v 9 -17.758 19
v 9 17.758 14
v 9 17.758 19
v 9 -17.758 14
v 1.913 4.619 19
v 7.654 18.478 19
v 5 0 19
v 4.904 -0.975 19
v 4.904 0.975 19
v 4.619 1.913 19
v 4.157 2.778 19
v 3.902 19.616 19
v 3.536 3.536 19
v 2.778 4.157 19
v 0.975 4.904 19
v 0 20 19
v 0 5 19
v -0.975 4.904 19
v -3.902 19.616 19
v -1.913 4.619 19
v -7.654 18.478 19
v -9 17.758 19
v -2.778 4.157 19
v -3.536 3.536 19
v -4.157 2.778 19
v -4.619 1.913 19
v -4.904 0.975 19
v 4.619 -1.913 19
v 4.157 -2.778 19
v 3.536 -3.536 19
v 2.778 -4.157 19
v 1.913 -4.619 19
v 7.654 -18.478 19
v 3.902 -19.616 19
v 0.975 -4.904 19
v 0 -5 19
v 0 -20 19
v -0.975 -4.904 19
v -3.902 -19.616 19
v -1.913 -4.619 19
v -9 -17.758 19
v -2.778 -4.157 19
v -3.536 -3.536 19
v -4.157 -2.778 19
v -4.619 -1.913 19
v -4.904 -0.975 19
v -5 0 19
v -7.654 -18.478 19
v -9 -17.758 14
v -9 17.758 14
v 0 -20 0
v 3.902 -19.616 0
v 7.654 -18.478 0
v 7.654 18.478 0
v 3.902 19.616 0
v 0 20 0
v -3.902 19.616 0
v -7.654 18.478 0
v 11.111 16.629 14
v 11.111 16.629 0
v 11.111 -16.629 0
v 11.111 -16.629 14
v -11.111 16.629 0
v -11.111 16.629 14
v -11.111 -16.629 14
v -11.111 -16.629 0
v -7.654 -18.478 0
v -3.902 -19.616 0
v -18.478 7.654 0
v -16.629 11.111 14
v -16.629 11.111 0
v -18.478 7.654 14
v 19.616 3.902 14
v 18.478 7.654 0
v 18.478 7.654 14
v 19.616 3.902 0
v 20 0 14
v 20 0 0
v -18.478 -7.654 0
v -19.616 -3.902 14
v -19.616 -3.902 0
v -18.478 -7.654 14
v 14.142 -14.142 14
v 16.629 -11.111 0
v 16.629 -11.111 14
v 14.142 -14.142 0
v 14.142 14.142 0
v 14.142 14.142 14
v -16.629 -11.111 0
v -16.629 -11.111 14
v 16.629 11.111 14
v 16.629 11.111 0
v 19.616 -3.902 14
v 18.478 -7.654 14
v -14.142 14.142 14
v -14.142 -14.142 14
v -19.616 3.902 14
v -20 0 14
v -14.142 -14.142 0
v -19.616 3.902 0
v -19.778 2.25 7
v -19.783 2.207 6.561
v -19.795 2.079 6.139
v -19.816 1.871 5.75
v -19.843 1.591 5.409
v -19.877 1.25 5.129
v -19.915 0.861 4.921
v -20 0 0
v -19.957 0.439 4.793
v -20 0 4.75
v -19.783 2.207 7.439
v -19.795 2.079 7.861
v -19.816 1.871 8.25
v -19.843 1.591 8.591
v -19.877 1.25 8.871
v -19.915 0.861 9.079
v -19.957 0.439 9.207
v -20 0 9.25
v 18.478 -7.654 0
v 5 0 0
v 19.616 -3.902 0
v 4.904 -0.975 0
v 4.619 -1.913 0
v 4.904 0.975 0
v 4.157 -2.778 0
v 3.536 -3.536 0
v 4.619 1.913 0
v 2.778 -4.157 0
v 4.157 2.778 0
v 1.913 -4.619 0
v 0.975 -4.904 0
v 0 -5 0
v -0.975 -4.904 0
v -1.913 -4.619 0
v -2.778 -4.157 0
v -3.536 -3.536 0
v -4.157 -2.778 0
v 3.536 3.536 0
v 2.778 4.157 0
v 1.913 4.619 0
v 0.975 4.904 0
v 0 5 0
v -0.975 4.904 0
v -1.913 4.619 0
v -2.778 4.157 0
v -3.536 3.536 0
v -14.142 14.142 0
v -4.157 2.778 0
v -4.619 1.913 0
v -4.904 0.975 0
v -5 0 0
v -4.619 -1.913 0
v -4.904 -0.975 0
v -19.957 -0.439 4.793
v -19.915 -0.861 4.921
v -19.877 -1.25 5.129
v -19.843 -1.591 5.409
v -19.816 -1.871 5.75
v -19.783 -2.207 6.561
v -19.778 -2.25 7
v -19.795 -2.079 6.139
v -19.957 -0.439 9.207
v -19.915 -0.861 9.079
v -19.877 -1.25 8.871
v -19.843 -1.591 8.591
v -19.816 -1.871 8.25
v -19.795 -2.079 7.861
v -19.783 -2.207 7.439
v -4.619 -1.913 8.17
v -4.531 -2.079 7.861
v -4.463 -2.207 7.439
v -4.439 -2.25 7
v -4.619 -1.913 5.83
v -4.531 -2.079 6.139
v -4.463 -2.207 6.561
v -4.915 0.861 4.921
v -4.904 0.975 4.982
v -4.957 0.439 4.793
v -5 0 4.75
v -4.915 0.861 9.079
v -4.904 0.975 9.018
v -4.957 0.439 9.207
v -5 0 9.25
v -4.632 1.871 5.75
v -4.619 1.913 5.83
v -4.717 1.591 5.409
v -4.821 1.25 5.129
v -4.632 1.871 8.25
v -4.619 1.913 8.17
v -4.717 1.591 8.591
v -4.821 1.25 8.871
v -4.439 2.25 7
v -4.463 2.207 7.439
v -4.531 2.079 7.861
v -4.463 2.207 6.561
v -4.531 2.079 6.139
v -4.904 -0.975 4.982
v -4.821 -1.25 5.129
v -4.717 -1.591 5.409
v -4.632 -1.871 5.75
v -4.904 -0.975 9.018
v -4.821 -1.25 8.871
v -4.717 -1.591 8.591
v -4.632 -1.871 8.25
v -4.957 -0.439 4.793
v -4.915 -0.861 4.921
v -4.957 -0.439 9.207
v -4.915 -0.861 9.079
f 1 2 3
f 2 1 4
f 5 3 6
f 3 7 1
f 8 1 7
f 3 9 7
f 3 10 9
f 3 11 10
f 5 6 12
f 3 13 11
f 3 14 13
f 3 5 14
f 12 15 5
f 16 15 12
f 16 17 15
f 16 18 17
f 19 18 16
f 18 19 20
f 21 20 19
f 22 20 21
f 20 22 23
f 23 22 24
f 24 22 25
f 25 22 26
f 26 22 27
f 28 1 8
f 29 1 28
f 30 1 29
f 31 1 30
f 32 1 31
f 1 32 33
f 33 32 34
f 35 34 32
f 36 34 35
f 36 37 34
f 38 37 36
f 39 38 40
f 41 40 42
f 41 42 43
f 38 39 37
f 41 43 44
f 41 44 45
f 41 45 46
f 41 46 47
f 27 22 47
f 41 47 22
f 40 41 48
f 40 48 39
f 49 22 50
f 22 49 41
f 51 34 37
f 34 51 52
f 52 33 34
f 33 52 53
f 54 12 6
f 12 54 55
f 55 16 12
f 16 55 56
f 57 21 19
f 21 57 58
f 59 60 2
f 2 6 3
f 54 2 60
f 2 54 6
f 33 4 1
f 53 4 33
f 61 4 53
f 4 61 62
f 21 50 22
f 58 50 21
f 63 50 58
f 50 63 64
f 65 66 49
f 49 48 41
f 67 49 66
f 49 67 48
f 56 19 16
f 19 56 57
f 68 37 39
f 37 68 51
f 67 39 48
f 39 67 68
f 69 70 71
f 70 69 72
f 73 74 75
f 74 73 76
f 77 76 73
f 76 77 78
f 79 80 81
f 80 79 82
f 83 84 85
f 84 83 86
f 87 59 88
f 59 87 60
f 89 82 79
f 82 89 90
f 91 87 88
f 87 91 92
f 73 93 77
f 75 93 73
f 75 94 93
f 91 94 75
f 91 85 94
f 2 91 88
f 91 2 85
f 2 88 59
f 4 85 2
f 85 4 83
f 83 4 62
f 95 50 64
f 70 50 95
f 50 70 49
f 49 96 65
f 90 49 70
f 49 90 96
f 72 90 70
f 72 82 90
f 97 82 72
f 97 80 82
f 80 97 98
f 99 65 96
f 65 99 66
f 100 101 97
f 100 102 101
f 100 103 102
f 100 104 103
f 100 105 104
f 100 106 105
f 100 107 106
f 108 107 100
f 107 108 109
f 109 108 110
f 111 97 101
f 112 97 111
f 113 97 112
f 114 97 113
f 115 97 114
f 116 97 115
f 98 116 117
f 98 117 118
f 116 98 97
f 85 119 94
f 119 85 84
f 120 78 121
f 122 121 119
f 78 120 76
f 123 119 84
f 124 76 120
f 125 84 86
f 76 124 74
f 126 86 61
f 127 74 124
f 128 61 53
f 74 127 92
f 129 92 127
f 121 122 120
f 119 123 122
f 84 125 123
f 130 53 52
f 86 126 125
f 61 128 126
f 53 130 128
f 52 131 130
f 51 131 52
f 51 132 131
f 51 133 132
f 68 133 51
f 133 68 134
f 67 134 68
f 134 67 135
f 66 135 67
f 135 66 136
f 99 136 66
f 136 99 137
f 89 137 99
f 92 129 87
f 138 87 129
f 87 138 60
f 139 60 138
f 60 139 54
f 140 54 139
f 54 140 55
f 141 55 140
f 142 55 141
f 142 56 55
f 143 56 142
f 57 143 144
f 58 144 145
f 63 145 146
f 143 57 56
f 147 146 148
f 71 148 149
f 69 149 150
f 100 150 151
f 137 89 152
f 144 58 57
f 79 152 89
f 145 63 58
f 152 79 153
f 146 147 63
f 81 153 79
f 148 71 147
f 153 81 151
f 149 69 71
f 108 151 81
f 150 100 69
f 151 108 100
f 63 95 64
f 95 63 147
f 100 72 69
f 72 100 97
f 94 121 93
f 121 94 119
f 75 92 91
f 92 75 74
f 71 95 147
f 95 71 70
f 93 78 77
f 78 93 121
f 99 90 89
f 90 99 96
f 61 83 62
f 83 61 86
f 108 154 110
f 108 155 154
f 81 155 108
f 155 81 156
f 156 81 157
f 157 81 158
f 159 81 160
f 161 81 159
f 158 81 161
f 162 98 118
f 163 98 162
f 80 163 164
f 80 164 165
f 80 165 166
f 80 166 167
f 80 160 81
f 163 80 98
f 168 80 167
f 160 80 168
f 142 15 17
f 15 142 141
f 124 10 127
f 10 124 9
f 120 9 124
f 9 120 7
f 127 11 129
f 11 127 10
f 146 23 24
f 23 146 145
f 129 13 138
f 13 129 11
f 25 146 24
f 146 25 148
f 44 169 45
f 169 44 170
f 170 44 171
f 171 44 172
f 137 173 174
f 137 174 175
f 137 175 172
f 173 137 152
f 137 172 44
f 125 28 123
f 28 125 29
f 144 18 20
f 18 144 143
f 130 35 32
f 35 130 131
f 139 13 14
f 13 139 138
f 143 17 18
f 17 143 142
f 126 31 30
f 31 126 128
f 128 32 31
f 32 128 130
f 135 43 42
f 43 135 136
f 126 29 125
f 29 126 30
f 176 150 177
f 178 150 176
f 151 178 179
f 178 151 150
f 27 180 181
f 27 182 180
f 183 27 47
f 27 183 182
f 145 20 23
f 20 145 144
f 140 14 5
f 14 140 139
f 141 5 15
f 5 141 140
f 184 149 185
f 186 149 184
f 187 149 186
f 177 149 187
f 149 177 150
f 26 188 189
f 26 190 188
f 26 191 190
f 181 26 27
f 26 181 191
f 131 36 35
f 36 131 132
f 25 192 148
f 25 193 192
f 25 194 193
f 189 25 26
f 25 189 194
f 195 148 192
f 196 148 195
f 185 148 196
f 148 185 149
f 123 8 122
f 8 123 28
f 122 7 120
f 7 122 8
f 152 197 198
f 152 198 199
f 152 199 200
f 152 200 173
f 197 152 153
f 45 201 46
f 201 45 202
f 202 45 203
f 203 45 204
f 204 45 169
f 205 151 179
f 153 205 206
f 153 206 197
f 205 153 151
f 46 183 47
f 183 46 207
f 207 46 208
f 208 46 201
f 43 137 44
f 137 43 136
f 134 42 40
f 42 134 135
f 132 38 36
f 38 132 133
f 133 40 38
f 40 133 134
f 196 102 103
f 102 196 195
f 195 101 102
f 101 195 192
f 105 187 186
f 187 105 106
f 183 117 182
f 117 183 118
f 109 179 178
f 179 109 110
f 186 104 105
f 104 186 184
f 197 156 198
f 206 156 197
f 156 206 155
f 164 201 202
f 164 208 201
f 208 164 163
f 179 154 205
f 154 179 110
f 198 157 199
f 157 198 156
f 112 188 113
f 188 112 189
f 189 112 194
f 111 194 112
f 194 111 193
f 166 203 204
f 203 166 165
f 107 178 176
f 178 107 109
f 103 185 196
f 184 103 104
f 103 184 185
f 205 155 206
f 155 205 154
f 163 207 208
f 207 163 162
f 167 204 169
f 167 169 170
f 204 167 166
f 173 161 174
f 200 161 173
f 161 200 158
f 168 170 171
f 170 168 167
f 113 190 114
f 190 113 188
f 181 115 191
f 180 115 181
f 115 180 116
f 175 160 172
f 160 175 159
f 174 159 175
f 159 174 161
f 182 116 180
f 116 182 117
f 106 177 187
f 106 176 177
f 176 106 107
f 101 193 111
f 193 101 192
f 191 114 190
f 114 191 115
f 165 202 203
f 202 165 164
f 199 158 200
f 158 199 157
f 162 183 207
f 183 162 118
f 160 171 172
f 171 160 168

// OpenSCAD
$fn = 32;

// ----------------------------------------------------------------------
// Oldham coupling hub: 40 x 19 mm
// ----------------------------------------------------------------------

// --- parameters (mm) ---
flange_dia = 40;          // hub diameter
flange_len = 14;          // hub length
hub_bore = 10;            // shaft bore
key_w = 18;               // drive tongue width
tongue_h = 5;             // drive tongue height
set_d = 4.5;              // set screw tap hole

module hub() {
  cylinder(h = flange_len, d = flange_dia);
  /* tongue, clipped to the hub disc and sunk 1 mm into the face */
  intersection() {
    translate([-key_w / 2, -flange_dia / 2, flange_len - 1])
      cube([key_w, flange_dia, tongue_h + 1]);
    translate([0, 0, flange_len - 1]) cylinder(h = tongue_h + 1, d = flange_dia);
  }
}

difference() {
  hub();
  translate([0, 0, -1]) cylinder(h = flange_len + tongue_h + 2, d = hub_bore);
  translate([-flange_dia / 2 - 1, 0, flange_len * 0.5])
    rotate([0, 90, 0]) cylinder(h = flange_dia / 2 + 2, d = set_d);
}
